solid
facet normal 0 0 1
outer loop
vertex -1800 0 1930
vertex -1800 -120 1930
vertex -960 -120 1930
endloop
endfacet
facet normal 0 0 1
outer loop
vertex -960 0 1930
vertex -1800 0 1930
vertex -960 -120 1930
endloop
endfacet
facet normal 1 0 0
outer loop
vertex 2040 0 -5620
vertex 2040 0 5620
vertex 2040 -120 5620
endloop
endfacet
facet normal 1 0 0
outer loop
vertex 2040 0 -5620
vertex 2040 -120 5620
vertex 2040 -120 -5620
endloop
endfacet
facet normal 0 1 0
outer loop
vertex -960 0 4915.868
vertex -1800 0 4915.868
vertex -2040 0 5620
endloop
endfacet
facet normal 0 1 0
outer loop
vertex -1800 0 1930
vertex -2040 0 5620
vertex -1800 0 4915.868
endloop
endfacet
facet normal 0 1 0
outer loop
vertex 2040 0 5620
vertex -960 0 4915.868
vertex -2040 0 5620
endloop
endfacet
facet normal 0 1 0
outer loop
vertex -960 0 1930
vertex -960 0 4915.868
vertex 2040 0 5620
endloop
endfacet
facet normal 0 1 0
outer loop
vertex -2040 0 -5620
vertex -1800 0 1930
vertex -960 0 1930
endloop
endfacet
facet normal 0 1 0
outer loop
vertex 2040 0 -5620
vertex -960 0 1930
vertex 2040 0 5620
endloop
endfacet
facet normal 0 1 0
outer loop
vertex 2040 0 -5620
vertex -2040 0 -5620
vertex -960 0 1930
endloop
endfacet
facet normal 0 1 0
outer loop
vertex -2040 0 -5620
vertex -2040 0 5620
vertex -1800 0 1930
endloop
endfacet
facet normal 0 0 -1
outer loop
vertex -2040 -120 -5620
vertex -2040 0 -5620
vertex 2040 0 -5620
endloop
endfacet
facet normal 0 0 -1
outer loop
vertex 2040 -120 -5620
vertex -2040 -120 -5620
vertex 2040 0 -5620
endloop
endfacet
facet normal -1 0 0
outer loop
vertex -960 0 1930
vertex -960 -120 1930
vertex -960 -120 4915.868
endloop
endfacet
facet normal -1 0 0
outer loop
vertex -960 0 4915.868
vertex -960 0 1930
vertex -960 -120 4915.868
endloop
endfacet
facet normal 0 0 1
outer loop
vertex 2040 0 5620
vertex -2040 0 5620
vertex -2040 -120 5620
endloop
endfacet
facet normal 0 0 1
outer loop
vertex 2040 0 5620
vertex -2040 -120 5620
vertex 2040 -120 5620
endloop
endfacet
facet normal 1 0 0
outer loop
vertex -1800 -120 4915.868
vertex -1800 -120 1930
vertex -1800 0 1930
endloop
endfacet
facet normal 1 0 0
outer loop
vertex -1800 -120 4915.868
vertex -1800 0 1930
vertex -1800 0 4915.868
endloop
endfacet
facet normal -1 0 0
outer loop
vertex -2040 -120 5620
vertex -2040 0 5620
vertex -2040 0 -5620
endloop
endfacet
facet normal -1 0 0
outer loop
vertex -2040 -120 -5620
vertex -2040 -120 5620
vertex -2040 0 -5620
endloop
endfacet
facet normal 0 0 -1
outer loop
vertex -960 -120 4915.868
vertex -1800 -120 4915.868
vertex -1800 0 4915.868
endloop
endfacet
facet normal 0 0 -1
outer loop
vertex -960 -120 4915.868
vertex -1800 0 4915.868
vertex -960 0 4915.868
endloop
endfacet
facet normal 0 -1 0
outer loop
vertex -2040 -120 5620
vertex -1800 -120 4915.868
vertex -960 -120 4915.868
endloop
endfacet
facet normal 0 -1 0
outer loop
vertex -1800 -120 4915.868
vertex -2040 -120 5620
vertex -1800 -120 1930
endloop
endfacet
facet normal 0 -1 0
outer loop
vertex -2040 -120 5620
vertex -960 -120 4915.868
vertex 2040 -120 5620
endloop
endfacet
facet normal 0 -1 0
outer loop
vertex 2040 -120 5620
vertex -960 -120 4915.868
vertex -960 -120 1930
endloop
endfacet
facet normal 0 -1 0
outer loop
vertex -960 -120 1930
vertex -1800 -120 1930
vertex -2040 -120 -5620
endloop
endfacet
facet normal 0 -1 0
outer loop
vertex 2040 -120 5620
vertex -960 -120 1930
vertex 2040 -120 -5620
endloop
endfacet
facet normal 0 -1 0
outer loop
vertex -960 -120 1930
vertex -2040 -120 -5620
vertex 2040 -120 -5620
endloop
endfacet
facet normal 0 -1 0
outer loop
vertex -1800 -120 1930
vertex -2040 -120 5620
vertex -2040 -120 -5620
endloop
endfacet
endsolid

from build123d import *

# Parameters (mm, degrees)
SKETCH_1_W            = 4080
SKETCH_1_H            = 11240
EXTRUDE_1_DEPTH       = 120
SKETCH_2_W            = 840
SKETCH_2_H            = 2985.867704249
CUT_EXTRUDE_646_DEPTH = 121


with BuildPart() as part:
    # 草图1 → 凸台-拉伸1 (new body)
    with BuildSketch(Plane(origin=(0, 0, 0), x_dir=(1, 0, 0), z_dir=(0, 1, 0))):
        Rectangle(SKETCH_1_W, SKETCH_1_H)
    extrude(amount=-EXTRUDE_1_DEPTH)

    # 草图2 → Cut-Extrude 646 (cut, through all)
    with BuildSketch(Plane.XZ.offset(120)):
        with Locations((-1380, 3422.933852124)):
            Rectangle(SKETCH_2_W, SKETCH_2_H)
    extrude(amount=-CUT_EXTRUDE_646_DEPTH, mode=Mode.SUBTRACT)


solid = part.part
